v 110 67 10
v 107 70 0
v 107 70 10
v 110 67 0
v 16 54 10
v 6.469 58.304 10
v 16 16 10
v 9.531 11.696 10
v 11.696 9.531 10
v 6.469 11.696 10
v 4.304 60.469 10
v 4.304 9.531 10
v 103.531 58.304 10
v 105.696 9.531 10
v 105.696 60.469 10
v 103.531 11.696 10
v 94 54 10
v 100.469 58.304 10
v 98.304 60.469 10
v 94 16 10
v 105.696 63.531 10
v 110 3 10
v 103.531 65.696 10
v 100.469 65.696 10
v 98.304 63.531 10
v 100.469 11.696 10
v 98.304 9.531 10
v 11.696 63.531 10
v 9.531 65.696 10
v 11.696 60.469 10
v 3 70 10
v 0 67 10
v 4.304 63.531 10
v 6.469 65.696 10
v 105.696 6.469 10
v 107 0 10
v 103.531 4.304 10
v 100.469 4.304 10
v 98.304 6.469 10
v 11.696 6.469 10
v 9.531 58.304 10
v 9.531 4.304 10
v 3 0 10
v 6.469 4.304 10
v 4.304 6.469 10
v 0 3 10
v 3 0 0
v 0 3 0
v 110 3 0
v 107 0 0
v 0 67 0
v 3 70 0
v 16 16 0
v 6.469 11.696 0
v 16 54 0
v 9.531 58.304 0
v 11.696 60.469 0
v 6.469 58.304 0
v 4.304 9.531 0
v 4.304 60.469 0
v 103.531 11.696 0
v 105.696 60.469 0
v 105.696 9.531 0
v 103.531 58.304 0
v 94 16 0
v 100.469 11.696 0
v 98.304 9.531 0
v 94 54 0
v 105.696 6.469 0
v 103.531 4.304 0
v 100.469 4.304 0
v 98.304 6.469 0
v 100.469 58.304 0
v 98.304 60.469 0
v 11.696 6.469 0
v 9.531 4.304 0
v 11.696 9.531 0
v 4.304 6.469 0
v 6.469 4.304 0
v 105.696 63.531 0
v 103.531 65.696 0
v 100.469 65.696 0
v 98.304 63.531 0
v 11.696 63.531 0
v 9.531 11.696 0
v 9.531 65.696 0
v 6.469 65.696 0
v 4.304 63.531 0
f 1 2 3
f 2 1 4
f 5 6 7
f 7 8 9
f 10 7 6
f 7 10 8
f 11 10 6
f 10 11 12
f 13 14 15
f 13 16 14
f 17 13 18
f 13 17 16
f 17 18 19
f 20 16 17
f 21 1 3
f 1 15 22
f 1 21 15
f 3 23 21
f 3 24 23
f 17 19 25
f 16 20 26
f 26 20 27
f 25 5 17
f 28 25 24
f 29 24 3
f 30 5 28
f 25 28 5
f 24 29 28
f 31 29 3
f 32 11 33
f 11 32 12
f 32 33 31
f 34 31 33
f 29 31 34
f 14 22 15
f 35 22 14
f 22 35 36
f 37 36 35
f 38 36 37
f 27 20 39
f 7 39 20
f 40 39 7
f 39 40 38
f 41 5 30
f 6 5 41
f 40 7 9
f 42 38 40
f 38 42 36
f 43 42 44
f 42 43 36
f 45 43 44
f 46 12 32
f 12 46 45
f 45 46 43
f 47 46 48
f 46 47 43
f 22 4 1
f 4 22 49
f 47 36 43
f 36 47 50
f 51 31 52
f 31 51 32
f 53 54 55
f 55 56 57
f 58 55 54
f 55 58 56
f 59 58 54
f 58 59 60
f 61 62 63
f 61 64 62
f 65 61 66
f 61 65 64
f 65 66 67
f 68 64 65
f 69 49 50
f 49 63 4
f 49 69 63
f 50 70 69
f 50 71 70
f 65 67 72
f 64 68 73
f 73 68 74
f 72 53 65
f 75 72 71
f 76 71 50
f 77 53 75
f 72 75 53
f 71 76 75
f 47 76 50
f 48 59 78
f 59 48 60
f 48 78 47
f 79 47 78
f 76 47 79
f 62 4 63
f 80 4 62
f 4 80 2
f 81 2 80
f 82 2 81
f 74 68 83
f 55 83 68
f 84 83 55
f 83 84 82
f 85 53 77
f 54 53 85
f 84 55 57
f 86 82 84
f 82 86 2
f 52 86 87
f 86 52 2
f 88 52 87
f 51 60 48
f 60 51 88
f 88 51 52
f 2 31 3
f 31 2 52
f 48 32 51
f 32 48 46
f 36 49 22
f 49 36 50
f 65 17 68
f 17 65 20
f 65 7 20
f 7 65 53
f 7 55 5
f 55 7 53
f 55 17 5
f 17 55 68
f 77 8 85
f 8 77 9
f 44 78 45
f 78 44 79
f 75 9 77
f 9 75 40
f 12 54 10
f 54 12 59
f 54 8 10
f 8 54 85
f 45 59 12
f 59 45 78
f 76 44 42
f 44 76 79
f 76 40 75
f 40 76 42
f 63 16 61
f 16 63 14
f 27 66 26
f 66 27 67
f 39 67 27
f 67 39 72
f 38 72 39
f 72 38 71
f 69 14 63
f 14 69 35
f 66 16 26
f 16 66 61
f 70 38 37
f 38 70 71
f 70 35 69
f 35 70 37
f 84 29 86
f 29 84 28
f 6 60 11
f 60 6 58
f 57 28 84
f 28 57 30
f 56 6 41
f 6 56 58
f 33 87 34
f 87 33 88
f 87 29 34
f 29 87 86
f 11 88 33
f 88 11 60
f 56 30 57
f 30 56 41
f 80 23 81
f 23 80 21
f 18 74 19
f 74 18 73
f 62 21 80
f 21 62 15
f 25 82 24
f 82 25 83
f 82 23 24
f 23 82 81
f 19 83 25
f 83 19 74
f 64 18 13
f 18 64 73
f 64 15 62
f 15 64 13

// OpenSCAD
$fn = 32;

// ----------------------------------------------------------------------
// Frame plate: 110 x 70 frame, 16 mm rails
// ----------------------------------------------------------------------

// --- parameters (mm) ---
plate_l = 110;            // plate length, X
plate_w = 70;             // plate width, Y
plate_t = 10;             // plate thickness, Z (extrusion height)
corner_c = 3;             // corner chamfer
frame_bar = 16;           // frame rail width
bolt_r = 4;               // corner bolt window radius
bolt_inset = 8;           // bolt centre inset from the edges

win_l = plate_l - 2 * frame_bar;  // window length
win_w = plate_w - 2 * frame_bar;  // window width
bolt_d = 2 * bolt_r;  // corner hole diameter

profile = [[3, 0], [107, 0], [110, 3], [110, 67], [107, 70], [3, 70], [0, 67], [0, 3]];  // primary outline, 8 points, counter clockwise
void_1 = [[16, 16], [94, 16], [94, 54], [16, 54]];  // the window, 4 points
void_2 = [[11.696, 9.531], [9.531, 11.696], [6.469, 11.696], [4.304, 9.531], [4.304, 6.469], [6.469, 4.304], [9.531, 4.304], [11.696, 6.469]];  // corner bolt window, 8 points
void_3 = [[105.696, 9.531], [103.531, 11.696], [100.469, 11.696], [98.304, 9.531], [98.304, 6.469], [100.469, 4.304], [103.531, 4.304], [105.696, 6.469]];  // corner bolt window, 8 points
void_4 = [[11.696, 63.531], [9.531, 65.696], [6.469, 65.696], [4.304, 63.531], [4.304, 60.469], [6.469, 58.304], [9.531, 58.304], [11.696, 60.469]];  // corner bolt window, 8 points
void_5 = [[105.696, 63.531], [103.531, 65.696], [100.469, 65.696], [98.304, 63.531], [98.304, 60.469], [100.469, 58.304], [103.531, 58.304], [105.696, 60.469]];  // corner bolt window, 8 points

// --- the one profile operation ---
difference() {
  linear_extrude(height = plate_t) polygon(points = profile);
  translate([0, 0, -1])
    linear_extrude(height = plate_t + 2) polygon(points = void_1);
  translate([0, 0, -1])
    linear_extrude(height = plate_t + 2) polygon(points = void_2);
  translate([0, 0, -1])
    linear_extrude(height = plate_t + 2) polygon(points = void_3);
  translate([0, 0, -1])
    linear_extrude(height = plate_t + 2) polygon(points = void_4);
  translate([0, 0, -1])
    linear_extrude(height = plate_t + 2) polygon(points = void_5);
}
